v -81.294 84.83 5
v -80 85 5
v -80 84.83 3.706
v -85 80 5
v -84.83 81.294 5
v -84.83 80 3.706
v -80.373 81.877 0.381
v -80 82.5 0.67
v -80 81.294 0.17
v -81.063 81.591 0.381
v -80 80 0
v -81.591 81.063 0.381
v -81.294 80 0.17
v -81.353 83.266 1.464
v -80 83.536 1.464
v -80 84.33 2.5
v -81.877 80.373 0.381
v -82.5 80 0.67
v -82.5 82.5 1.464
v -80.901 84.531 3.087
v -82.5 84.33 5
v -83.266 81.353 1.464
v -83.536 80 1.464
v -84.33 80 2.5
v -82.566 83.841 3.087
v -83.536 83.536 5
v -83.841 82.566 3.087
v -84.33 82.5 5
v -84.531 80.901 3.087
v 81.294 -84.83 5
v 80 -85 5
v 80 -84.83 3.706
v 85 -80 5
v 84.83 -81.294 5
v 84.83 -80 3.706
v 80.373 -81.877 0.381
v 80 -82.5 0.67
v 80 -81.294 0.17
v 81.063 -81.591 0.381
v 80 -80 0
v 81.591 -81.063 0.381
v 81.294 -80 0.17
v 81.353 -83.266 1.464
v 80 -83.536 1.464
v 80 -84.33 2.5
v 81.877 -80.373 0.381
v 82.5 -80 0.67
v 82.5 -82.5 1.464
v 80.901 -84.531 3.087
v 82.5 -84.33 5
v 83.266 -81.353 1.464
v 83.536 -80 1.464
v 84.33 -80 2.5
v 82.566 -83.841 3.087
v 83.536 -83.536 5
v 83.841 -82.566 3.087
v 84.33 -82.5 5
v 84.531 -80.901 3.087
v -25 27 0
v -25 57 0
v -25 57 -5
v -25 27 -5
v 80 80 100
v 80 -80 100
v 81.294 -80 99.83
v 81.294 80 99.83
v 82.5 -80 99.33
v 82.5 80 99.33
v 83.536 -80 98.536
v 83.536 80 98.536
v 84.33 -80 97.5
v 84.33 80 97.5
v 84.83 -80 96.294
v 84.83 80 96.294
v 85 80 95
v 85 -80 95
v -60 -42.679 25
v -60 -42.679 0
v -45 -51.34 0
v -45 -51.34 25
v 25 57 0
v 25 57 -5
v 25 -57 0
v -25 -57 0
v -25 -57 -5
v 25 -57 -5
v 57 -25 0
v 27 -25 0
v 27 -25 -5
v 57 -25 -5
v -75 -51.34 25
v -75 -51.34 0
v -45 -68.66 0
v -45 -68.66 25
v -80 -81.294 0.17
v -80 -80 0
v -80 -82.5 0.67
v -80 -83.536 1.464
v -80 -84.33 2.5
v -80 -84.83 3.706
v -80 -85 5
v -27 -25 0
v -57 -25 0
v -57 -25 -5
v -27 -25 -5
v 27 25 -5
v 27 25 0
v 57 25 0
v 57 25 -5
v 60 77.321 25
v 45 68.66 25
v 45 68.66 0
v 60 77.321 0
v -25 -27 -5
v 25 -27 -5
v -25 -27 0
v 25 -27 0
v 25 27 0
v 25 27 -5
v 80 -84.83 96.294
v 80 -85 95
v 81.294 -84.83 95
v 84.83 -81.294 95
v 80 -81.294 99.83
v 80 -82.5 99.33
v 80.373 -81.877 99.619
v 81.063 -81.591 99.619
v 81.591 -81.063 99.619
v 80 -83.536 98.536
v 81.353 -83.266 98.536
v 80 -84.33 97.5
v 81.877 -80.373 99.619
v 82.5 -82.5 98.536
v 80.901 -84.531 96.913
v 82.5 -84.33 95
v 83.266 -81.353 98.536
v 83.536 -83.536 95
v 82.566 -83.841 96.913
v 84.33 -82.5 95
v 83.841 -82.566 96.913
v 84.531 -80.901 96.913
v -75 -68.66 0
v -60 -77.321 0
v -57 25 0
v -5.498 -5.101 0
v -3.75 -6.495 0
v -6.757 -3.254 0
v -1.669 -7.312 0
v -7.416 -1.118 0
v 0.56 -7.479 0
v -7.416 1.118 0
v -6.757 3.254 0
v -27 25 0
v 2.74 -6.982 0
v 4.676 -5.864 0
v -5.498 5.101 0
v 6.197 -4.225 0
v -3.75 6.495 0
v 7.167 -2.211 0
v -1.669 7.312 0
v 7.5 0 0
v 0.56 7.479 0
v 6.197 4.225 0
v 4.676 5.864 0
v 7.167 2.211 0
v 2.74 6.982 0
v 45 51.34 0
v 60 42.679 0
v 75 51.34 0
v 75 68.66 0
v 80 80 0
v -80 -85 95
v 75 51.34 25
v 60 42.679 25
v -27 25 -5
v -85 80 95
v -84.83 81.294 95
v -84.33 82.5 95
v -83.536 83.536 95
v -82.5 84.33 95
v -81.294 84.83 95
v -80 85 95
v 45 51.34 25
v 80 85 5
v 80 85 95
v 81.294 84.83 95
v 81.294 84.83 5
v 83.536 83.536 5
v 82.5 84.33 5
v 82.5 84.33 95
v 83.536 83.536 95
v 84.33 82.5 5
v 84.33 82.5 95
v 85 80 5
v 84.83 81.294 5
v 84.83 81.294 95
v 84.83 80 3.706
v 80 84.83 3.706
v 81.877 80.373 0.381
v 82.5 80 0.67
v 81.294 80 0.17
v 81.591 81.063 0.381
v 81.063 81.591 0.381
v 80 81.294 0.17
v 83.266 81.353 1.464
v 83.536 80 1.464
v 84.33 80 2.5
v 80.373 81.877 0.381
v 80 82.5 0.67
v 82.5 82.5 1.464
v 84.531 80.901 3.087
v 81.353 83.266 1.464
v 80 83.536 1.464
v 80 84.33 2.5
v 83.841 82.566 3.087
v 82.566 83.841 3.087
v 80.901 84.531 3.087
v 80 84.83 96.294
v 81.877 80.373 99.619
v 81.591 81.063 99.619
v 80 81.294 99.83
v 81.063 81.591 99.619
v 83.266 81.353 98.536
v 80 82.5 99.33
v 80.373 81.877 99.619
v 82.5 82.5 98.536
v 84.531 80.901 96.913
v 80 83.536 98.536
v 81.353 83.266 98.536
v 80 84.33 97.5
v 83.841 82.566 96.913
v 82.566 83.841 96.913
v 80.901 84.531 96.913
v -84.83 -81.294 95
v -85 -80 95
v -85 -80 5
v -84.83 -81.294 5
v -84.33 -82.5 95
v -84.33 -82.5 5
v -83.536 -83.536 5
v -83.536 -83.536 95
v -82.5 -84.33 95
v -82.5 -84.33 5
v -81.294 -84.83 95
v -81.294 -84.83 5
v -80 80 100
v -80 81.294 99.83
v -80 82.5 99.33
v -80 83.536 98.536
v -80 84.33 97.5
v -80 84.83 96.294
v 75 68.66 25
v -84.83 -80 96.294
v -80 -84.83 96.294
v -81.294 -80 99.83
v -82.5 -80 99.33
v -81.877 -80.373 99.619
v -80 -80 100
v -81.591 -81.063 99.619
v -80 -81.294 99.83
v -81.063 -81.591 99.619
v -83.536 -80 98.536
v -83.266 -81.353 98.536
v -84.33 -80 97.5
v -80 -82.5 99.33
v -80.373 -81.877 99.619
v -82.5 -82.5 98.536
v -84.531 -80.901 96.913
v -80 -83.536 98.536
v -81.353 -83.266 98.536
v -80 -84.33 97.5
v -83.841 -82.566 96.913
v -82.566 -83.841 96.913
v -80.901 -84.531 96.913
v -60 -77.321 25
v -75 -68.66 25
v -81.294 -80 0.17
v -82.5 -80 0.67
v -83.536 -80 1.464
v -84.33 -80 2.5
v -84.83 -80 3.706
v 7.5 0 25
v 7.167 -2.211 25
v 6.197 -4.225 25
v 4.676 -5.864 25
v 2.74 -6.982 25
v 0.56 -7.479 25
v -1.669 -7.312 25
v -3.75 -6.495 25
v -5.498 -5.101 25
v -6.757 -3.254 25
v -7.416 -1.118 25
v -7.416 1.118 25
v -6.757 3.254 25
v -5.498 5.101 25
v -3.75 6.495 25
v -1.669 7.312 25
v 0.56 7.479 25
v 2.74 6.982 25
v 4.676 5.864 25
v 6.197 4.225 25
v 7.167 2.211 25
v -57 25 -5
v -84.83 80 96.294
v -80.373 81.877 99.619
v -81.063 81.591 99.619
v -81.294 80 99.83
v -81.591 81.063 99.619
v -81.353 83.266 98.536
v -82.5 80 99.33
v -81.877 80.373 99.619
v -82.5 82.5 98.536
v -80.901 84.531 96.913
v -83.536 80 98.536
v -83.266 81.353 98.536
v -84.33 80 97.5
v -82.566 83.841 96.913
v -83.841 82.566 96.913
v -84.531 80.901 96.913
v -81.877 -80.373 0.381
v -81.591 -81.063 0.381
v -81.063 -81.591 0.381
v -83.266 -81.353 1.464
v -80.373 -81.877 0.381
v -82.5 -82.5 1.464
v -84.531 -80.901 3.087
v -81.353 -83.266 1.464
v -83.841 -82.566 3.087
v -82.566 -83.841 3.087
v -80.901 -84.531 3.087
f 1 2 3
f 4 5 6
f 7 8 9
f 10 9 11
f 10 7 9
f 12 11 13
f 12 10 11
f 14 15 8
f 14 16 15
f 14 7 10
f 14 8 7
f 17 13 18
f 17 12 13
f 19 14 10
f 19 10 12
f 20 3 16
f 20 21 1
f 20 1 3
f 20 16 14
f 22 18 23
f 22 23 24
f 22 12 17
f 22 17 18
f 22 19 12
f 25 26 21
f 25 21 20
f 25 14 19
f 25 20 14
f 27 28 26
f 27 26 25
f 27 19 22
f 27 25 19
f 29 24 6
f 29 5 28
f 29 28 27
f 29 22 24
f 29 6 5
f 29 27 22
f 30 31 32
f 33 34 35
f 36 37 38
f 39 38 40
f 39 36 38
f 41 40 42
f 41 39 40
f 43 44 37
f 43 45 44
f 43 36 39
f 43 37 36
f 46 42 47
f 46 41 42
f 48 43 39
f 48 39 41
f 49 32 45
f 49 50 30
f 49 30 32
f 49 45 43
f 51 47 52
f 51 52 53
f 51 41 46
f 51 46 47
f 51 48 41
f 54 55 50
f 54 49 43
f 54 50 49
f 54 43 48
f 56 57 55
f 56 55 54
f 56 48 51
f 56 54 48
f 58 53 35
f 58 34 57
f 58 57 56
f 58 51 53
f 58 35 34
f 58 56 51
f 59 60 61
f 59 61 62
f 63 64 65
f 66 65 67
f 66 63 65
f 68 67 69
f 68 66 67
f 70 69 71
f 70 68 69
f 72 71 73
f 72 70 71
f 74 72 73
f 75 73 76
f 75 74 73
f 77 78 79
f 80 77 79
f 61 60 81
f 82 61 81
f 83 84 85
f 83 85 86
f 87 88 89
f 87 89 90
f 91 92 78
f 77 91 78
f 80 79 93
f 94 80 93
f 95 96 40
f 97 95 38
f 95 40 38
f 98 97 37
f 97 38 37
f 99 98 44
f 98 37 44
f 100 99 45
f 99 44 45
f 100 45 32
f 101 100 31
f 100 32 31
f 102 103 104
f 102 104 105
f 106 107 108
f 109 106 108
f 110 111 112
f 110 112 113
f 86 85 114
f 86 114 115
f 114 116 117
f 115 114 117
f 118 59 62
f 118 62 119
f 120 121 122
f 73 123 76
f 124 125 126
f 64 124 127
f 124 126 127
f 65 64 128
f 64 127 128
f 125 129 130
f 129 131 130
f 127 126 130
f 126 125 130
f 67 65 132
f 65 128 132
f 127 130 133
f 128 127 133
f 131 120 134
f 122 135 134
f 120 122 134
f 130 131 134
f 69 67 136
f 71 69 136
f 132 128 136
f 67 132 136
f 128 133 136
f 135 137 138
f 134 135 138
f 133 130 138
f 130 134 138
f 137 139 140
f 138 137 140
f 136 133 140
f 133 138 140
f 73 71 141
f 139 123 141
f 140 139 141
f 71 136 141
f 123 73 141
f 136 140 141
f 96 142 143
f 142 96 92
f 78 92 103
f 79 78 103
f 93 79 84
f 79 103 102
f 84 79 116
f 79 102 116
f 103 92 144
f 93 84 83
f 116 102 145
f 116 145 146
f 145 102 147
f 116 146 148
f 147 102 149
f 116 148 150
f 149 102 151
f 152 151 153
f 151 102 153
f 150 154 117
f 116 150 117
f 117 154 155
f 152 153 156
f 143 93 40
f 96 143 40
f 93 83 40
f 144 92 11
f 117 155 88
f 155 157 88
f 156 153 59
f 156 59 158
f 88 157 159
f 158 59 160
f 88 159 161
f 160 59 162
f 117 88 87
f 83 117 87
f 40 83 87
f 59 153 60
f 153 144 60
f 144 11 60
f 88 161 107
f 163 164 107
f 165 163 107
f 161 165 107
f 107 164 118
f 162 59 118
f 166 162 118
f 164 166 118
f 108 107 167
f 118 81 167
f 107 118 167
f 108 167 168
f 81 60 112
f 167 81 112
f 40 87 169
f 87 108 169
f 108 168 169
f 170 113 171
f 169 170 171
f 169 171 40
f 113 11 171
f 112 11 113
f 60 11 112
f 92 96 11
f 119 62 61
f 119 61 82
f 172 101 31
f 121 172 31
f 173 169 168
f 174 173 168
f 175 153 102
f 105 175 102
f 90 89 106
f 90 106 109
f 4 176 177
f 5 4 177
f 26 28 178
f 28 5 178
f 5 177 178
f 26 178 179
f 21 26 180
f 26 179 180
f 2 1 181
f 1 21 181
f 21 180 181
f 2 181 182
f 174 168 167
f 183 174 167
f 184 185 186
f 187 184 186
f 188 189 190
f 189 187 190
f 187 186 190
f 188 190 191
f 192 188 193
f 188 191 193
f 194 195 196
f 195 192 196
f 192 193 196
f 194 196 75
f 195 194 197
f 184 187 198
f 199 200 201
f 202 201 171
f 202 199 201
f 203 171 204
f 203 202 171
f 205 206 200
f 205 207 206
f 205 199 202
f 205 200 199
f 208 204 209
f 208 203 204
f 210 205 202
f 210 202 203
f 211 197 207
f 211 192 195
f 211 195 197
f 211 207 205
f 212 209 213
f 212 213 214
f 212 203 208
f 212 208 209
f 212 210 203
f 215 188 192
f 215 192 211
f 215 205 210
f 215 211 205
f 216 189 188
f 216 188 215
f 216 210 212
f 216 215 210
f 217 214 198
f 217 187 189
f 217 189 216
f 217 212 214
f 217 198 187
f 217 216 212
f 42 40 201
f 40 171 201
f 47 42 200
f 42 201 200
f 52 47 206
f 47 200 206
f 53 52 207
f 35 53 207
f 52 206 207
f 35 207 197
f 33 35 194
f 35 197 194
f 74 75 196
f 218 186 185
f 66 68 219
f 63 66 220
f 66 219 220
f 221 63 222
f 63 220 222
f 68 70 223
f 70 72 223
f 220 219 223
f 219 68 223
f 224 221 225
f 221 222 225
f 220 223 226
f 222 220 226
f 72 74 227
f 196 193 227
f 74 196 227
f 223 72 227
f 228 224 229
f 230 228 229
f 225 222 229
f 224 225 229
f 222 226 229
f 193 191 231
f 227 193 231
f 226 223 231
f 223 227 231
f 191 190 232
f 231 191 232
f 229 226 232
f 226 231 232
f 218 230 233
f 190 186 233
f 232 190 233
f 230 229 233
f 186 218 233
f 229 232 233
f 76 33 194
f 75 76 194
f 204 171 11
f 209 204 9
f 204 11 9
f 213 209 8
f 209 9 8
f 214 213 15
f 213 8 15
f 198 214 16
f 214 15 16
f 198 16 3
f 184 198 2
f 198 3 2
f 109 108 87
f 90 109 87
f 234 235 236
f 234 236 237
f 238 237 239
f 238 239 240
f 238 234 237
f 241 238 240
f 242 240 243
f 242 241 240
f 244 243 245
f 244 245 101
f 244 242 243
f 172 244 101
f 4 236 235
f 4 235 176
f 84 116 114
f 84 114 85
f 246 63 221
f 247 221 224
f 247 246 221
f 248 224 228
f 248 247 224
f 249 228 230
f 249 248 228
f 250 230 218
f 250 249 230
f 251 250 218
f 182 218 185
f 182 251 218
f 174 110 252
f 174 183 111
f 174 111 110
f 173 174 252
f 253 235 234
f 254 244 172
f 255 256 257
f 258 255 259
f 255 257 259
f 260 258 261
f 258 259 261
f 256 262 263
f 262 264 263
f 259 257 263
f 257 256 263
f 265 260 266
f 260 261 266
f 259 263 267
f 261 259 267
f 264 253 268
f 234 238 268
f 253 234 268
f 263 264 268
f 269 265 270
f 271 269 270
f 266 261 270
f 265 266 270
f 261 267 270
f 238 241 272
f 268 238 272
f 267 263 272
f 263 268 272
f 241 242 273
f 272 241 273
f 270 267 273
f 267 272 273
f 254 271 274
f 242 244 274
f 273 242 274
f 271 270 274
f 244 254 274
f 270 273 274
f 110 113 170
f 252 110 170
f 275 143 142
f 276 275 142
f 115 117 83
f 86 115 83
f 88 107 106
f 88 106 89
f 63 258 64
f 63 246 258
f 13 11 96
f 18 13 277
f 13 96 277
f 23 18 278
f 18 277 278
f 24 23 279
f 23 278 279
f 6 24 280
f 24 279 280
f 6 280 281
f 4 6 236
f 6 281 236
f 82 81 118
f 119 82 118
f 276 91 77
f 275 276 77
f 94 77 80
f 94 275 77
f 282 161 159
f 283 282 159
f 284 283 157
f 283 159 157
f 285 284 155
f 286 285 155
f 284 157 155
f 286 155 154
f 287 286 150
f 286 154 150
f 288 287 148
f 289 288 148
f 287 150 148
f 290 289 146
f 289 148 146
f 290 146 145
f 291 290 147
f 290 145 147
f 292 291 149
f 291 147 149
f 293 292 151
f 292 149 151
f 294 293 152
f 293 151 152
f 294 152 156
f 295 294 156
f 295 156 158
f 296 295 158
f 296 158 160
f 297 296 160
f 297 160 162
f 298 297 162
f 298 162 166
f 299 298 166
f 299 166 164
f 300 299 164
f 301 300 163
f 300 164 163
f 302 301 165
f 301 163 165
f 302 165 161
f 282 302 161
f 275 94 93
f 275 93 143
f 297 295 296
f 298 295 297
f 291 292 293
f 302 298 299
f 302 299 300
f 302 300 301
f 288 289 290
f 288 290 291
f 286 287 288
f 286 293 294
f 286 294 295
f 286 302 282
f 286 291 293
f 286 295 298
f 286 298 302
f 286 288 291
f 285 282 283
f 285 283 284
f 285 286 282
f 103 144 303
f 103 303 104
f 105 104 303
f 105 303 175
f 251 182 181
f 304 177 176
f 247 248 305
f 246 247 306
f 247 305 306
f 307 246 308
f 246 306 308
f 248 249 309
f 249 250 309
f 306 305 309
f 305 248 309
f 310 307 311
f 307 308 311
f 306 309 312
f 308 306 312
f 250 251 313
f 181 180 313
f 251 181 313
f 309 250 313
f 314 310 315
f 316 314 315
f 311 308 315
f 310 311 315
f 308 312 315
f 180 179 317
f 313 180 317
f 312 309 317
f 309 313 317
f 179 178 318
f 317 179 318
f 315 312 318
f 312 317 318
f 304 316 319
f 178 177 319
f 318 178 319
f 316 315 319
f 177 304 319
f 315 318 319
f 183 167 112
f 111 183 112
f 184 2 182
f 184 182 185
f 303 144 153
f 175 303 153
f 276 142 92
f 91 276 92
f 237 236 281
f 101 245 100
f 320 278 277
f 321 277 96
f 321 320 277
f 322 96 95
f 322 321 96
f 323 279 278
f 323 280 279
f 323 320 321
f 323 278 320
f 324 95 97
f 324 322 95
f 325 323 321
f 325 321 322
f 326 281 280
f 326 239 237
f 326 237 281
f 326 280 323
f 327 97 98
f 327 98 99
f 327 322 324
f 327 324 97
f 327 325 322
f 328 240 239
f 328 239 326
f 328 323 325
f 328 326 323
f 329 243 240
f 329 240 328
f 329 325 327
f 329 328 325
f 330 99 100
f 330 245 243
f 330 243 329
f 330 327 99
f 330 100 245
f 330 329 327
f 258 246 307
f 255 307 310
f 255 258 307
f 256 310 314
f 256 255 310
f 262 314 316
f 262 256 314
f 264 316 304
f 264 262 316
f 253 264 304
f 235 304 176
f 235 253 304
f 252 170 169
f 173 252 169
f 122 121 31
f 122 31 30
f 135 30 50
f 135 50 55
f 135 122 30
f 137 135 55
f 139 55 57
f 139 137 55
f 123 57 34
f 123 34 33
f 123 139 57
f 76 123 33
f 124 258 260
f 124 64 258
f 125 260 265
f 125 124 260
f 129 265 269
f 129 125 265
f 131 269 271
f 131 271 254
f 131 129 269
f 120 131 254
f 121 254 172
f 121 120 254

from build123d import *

# Parameters (mm, degrees)
F0_W     = 170
F0_H     = 170
F1_DEPTH = 100
F2_R     = 7.5
F3_DEPTH = 25
F4_R     = 5
F5_R     = 5
F6_W     = 50
F6_H     = 30
F6_W_2   = 30
F6_H_2   = 50
F7_DEPTH = 5


with BuildPart() as f1:
    # F0 (on Top) → F1 (new body)
    with BuildSketch(Plane.XY):
        Rectangle(F0_W, F0_H)
    extrude(amount=F1_DEPTH)

    # F2 (on face) → F3 (cut)
    with BuildSketch(Plane(origin=(0, 0, 0), x_dir=(1, 0, 0), z_dir=(0, 0, -1))):
        Circle(F2_R)
        Polygon((-60, 77.320508), (-75, 68.660254), (-75, 51.339746), (-60, 42.679492), (-45, 51.339746), (-45, 68.660254), align=None)
        Polygon((60, -77.320508), (75, -68.660254), (75, -51.339746), (60, -42.679492), (45, -51.339746), (45, -68.660254), align=None)
    extrude(amount=-F3_DEPTH, mode=Mode.SUBTRACT)

    # F4
    f4_edges = [f1.edges().sort_by_distance(p)[0] for p in [
        (-85, -85, 50),
        (85, -85, 50),
        (85, 85, 50),
        (-85, 85, 50),
    ]]
    fillet(f4_edges, radius=F4_R)

    # F5
    f5_edges = [f1.edges().sort_by_distance(p)[0] for p in [
        (0, -85, 100),
        (85, 0, 0),
    ]]
    fillet(f5_edges, radius=F5_R)

    # F6 (on face) → F7 (join)
    with BuildSketch(Plane(origin=(0, 0, 0), x_dir=(1, 0, 0), z_dir=(0, 0, -1))):
        with Locations((0, 42)):
            Rectangle(F6_W, F6_H)
        with Locations((42, 0)):
            Rectangle(F6_W_2, F6_H_2)
        with Locations((-42, 0)):
            Rectangle(F6_W_2, F6_H_2)
        with Locations((0, -42)):
            Rectangle(F6_W, F6_H)
    extrude(amount=F7_DEPTH)


solid = f1.part
